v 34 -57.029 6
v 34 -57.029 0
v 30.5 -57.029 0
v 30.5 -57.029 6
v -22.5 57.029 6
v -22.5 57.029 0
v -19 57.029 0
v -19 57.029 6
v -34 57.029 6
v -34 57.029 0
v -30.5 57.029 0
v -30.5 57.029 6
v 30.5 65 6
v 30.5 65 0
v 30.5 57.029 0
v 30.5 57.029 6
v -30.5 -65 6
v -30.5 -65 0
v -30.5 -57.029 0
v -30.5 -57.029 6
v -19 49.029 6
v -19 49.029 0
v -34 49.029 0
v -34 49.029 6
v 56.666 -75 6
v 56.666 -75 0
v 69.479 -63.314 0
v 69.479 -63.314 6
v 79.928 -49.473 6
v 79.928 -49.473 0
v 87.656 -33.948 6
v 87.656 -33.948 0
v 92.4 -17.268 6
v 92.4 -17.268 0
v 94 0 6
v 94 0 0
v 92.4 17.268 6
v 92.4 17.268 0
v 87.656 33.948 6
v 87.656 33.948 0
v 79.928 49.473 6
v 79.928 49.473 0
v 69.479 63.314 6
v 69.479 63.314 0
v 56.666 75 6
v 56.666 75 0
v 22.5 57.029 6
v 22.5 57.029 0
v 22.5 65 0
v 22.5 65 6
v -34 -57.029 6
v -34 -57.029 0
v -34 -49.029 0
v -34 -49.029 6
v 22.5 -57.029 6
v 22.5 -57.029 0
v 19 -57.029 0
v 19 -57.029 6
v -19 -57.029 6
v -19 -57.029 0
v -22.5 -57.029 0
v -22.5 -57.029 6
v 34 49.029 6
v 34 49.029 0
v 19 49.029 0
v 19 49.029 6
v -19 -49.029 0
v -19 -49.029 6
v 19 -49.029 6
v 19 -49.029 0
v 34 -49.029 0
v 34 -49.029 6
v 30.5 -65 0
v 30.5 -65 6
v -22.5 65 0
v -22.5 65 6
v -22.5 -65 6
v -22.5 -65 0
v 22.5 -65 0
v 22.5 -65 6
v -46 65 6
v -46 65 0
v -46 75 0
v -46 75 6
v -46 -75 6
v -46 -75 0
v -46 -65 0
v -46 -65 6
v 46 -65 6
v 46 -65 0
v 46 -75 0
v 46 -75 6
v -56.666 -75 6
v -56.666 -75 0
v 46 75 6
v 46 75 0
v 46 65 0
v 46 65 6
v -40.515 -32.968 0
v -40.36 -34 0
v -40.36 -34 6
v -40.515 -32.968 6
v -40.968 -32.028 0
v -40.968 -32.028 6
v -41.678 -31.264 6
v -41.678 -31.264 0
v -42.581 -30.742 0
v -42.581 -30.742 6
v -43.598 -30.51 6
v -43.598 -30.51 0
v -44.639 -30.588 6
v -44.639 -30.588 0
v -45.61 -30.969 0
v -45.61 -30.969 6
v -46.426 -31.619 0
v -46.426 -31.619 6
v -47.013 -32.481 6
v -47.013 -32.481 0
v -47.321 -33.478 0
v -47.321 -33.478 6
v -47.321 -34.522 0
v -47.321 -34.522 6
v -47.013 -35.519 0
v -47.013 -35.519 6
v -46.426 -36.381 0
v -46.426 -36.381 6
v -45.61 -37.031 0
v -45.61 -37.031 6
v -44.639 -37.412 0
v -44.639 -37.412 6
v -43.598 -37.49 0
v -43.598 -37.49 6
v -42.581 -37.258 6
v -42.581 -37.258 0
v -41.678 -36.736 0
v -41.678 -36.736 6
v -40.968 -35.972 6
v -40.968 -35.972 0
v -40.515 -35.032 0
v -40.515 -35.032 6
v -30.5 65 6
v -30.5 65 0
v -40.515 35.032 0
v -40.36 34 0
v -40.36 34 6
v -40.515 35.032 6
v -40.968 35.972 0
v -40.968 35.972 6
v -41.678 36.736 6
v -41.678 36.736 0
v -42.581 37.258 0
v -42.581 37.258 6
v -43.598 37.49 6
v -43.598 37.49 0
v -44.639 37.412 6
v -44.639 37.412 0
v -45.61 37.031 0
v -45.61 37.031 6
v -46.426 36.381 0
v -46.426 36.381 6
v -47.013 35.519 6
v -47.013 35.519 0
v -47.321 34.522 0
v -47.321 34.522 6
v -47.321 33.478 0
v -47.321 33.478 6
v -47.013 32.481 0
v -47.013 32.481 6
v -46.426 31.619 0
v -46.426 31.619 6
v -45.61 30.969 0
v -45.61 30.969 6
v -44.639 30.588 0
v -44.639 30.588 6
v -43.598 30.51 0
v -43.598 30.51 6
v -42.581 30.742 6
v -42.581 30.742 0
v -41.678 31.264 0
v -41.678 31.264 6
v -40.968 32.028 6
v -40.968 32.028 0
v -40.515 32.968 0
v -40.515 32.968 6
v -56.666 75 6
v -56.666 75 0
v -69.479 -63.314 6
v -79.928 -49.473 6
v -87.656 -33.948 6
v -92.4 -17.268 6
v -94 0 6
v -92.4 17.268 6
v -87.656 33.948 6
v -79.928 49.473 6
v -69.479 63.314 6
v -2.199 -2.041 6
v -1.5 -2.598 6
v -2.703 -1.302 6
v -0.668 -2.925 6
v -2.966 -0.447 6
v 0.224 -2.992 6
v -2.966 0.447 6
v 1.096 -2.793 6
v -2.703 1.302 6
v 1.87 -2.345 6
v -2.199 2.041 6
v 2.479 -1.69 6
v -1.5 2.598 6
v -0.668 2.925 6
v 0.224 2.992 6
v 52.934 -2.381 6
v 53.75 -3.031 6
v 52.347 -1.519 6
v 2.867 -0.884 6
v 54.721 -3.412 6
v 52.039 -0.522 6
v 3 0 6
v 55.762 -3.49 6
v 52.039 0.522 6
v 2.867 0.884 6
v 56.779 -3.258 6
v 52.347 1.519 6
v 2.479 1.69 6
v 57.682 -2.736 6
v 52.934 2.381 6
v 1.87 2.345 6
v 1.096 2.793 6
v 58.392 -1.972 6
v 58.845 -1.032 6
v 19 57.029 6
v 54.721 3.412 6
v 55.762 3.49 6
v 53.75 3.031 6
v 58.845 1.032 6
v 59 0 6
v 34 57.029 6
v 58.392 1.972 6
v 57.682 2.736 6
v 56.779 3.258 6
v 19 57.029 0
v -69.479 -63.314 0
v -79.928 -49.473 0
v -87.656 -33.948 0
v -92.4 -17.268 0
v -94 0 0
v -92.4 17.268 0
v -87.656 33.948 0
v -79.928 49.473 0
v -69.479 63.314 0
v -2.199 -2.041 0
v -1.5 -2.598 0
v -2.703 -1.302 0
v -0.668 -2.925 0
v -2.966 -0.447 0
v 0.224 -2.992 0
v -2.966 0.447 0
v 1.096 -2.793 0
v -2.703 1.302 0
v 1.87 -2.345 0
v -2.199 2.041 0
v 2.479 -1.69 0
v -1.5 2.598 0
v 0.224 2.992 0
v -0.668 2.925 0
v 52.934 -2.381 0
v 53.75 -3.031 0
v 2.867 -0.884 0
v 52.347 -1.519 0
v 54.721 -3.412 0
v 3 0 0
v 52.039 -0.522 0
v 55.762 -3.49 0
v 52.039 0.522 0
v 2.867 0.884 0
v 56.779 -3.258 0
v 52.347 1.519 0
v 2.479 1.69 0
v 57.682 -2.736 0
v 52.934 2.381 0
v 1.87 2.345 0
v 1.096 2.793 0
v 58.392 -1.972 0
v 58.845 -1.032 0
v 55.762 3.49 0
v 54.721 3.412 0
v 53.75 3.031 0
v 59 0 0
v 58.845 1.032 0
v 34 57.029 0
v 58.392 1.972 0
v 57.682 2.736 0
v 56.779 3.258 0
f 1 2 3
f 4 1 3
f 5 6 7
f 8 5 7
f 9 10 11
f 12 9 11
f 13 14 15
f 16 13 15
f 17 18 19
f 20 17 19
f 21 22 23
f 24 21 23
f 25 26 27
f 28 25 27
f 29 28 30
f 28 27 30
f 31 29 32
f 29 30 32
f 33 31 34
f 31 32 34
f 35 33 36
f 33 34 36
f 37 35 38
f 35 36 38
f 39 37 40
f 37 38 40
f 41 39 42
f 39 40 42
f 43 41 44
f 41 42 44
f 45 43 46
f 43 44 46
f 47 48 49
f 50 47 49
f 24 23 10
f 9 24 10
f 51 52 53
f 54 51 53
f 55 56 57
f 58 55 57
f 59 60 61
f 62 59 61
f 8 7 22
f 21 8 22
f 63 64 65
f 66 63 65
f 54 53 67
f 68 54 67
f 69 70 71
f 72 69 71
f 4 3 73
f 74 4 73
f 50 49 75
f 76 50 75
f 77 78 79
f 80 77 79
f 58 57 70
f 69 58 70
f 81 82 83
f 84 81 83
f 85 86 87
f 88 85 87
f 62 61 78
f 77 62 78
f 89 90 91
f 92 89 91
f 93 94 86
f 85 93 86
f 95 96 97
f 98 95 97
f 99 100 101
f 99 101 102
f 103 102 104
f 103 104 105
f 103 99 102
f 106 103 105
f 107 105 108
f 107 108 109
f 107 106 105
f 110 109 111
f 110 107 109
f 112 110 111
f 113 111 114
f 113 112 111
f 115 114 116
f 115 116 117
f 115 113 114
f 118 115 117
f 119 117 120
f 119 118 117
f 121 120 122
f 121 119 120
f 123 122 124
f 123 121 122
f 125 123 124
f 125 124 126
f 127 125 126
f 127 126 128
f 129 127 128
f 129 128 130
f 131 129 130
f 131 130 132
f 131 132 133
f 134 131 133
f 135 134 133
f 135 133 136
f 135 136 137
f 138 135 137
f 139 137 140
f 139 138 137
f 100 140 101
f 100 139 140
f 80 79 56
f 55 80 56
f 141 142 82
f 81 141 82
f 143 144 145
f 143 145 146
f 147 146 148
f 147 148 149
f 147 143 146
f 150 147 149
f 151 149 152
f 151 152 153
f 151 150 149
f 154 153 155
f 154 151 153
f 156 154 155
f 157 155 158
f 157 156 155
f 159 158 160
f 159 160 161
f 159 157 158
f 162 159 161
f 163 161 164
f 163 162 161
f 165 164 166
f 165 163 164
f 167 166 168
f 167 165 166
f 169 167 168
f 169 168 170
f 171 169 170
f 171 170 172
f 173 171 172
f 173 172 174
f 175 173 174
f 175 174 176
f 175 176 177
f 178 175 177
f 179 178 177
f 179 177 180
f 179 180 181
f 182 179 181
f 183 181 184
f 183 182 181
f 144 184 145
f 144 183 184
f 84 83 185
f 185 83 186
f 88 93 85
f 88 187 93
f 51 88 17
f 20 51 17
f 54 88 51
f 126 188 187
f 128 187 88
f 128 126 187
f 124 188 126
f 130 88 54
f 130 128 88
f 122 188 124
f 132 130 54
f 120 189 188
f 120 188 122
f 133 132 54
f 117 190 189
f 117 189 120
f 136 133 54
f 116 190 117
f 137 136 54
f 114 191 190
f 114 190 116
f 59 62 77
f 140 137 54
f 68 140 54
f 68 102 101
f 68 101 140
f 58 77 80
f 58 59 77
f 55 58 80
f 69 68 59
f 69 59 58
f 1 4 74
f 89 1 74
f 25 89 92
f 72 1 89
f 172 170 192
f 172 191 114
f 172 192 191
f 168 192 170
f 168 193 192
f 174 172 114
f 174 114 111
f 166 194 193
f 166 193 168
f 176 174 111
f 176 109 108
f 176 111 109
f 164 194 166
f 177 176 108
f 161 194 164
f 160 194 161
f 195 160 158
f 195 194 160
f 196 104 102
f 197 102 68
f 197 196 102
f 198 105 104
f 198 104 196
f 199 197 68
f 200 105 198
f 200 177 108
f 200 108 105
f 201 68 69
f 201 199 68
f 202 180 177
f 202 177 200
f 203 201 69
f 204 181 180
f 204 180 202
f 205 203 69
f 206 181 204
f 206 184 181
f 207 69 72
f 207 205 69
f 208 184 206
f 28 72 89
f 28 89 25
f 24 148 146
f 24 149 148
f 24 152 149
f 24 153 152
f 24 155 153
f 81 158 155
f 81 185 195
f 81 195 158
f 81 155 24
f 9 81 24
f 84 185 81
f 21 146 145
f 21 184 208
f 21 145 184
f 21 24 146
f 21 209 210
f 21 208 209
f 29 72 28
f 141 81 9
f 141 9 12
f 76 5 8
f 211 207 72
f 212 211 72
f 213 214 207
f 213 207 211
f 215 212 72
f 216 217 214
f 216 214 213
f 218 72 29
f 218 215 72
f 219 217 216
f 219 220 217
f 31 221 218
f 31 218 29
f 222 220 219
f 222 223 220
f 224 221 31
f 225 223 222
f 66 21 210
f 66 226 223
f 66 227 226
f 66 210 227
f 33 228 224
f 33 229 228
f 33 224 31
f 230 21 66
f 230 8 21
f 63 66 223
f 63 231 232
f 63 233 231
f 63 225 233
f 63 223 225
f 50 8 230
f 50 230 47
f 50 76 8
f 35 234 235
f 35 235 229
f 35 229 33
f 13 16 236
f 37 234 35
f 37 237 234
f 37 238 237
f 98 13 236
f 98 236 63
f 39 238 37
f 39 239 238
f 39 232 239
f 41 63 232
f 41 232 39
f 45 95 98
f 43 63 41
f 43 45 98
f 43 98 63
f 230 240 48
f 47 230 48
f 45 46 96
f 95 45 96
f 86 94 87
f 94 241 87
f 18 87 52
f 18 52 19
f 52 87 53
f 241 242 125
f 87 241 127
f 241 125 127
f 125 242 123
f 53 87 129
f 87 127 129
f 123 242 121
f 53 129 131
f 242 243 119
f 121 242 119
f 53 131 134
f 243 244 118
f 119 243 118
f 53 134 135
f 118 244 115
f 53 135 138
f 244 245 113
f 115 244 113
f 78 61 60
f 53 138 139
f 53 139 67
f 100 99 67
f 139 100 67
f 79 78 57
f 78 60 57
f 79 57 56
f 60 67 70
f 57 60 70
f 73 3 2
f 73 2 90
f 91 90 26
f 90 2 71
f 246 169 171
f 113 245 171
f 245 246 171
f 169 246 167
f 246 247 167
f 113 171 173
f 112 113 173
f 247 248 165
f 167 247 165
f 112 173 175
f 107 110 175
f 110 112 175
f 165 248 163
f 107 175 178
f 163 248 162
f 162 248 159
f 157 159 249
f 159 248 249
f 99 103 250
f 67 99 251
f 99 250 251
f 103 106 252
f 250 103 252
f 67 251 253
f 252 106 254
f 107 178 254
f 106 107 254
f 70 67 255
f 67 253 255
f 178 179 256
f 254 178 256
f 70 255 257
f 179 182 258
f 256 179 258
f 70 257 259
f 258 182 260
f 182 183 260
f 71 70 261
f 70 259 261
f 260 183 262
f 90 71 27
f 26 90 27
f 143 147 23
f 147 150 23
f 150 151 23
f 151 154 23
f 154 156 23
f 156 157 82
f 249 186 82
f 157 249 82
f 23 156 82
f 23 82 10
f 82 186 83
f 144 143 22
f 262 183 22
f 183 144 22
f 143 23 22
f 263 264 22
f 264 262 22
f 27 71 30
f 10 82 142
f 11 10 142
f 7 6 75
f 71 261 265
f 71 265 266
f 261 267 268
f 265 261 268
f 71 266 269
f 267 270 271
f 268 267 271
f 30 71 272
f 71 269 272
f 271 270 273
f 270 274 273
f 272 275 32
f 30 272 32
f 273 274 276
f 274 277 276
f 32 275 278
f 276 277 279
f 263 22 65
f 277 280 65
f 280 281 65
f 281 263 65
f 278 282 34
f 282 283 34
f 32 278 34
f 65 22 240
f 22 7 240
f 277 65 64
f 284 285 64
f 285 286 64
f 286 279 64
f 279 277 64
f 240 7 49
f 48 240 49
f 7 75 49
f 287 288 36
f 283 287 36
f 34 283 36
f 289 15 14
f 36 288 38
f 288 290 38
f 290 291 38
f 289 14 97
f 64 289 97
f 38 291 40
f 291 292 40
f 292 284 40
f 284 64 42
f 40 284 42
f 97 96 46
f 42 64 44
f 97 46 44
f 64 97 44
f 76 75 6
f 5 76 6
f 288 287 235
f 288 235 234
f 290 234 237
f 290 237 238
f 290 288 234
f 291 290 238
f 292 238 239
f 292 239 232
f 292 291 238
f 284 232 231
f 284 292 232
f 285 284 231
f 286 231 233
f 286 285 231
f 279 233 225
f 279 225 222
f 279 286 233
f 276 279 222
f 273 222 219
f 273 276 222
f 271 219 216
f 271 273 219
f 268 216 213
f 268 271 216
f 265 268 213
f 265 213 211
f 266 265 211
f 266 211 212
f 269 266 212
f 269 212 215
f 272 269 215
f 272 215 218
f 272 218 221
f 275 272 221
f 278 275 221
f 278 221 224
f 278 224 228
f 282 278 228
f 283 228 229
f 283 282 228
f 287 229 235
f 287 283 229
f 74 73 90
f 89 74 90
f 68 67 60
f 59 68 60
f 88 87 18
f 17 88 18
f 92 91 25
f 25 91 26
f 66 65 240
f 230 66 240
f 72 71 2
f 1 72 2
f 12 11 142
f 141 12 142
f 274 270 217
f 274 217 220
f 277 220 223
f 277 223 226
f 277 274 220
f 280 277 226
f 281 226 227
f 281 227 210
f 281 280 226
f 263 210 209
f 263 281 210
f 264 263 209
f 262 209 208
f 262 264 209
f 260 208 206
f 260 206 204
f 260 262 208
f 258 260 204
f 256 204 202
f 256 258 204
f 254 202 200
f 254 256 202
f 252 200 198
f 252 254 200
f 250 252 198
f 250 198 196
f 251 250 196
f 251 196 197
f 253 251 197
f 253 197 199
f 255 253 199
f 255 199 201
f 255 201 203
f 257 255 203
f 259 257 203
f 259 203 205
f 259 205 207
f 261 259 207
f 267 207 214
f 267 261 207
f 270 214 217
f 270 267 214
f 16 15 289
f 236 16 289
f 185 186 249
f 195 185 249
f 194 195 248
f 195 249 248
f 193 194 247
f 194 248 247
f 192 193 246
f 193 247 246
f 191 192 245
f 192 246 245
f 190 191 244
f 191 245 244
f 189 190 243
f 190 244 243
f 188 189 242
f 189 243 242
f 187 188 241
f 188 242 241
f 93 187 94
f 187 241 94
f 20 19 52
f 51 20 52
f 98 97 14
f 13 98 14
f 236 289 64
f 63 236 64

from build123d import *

# Parameters (mm, degrees)
SKETCH8_R           = 3.5
SKETCH8_R_2         = 3
BOSS_EXTRUDE3_DEPTH = 6


with BuildPart() as part:
    # Sketch8 → Boss-Extrude3 (new body)
    with BuildSketch(Plane.XY):
        with BuildLine():
            Line((-56.665686266, -75), (-46, -75))
            Line((-46, -75), (-46, -65))
            Line((-46, -65), (-30.5, -65))
            Line((-30.5, -65), (-30.5, -57.029309822))
            Line((-30.5, -57.029309822), (-34, -57.029309822))
            Line((-34, -57.029309822), (-34, -49.029309822))
            Line((-34, -49.029309822), (-19, -49.029309822))
            Line((-19, -49.029309822), (-19, -57.029309822))
            Line((-19, -57.029309822), (-22.5, -57.029309822))
            Line((-22.5, -57.029309822), (-22.5, -65))
            Line((-22.5, -65), (22.5, -65))
            Line((22.5, -65), (22.5, -57.029309822))
            Line((22.5, -57.029309822), (19, -57.029309822))
            Line((19, -57.029309822), (19, -49.029309822))
            Line((19, -49.029309822), (34, -49.029309822))
            Line((34, -49.029309822), (34, -57.029309822))
            Line((34, -57.029309822), (30.5, -57.029309822))
            Line((30.5, -57.029309822), (30.5, -65))
            Line((30.5, -65), (46, -65))
            Line((46, -65), (46, -75))
            Line((46, -75), (56.665686266, -75))
            ThreePointArc((56.665686266, -75), (94, 0), (56.665686266, 75))
            Line((56.665686266, 75), (46, 75))
            Line((46, 75), (46, 65))
            Line((46, 65), (30.5, 65))
            Line((30.5, 65), (30.5, 57.029309822))
            Line((30.5, 57.029309822), (34, 57.029309822))
            Line((34, 57.029309822), (34, 49.029309822))
            Line((34, 49.029309822), (19, 49.029309822))
            Line((19, 49.029309822), (19, 57.029309822))
            Line((19, 57.029309822), (22.5, 57.029309822))
            Line((22.5, 57.029309822), (22.5, 65))
            Line((22.5, 65), (-22.5, 65))
            Line((-22.5, 65), (-22.5, 57.029309822))
            Line((-22.5, 57.029309822), (-19, 57.029309822))
            Line((-19, 57.029309822), (-19, 49.029309822))
            Line((-19, 49.029309822), (-34, 49.029309822))
            Line((-34, 49.029309822), (-34, 57.029309822))
            Line((-34, 57.029309822), (-30.5, 57.029309822))
            Line((-30.5, 57.029309822), (-30.5, 65))
            Line((-30.5, 65), (-46, 65))
            Line((-46, 65), (-46, 75))
            Line((-46, 75), (-56.665686266, 75))
            ThreePointArc((-56.665686266, 75), (-94, 0), (-56.665686266, -75))
        make_face()
        with Locations((-43.86, 34)):
            Circle(SKETCH8_R, mode=Mode.SUBTRACT)
        with Locations((55.5, 0)):
            Circle(SKETCH8_R, mode=Mode.SUBTRACT)
        with Locations((-43.86, -34)):
            Circle(SKETCH8_R, mode=Mode.SUBTRACT)
        Circle(SKETCH8_R_2, mode=Mode.SUBTRACT)
    extrude(amount=BOSS_EXTRUDE3_DEPTH)


solid = part.part
